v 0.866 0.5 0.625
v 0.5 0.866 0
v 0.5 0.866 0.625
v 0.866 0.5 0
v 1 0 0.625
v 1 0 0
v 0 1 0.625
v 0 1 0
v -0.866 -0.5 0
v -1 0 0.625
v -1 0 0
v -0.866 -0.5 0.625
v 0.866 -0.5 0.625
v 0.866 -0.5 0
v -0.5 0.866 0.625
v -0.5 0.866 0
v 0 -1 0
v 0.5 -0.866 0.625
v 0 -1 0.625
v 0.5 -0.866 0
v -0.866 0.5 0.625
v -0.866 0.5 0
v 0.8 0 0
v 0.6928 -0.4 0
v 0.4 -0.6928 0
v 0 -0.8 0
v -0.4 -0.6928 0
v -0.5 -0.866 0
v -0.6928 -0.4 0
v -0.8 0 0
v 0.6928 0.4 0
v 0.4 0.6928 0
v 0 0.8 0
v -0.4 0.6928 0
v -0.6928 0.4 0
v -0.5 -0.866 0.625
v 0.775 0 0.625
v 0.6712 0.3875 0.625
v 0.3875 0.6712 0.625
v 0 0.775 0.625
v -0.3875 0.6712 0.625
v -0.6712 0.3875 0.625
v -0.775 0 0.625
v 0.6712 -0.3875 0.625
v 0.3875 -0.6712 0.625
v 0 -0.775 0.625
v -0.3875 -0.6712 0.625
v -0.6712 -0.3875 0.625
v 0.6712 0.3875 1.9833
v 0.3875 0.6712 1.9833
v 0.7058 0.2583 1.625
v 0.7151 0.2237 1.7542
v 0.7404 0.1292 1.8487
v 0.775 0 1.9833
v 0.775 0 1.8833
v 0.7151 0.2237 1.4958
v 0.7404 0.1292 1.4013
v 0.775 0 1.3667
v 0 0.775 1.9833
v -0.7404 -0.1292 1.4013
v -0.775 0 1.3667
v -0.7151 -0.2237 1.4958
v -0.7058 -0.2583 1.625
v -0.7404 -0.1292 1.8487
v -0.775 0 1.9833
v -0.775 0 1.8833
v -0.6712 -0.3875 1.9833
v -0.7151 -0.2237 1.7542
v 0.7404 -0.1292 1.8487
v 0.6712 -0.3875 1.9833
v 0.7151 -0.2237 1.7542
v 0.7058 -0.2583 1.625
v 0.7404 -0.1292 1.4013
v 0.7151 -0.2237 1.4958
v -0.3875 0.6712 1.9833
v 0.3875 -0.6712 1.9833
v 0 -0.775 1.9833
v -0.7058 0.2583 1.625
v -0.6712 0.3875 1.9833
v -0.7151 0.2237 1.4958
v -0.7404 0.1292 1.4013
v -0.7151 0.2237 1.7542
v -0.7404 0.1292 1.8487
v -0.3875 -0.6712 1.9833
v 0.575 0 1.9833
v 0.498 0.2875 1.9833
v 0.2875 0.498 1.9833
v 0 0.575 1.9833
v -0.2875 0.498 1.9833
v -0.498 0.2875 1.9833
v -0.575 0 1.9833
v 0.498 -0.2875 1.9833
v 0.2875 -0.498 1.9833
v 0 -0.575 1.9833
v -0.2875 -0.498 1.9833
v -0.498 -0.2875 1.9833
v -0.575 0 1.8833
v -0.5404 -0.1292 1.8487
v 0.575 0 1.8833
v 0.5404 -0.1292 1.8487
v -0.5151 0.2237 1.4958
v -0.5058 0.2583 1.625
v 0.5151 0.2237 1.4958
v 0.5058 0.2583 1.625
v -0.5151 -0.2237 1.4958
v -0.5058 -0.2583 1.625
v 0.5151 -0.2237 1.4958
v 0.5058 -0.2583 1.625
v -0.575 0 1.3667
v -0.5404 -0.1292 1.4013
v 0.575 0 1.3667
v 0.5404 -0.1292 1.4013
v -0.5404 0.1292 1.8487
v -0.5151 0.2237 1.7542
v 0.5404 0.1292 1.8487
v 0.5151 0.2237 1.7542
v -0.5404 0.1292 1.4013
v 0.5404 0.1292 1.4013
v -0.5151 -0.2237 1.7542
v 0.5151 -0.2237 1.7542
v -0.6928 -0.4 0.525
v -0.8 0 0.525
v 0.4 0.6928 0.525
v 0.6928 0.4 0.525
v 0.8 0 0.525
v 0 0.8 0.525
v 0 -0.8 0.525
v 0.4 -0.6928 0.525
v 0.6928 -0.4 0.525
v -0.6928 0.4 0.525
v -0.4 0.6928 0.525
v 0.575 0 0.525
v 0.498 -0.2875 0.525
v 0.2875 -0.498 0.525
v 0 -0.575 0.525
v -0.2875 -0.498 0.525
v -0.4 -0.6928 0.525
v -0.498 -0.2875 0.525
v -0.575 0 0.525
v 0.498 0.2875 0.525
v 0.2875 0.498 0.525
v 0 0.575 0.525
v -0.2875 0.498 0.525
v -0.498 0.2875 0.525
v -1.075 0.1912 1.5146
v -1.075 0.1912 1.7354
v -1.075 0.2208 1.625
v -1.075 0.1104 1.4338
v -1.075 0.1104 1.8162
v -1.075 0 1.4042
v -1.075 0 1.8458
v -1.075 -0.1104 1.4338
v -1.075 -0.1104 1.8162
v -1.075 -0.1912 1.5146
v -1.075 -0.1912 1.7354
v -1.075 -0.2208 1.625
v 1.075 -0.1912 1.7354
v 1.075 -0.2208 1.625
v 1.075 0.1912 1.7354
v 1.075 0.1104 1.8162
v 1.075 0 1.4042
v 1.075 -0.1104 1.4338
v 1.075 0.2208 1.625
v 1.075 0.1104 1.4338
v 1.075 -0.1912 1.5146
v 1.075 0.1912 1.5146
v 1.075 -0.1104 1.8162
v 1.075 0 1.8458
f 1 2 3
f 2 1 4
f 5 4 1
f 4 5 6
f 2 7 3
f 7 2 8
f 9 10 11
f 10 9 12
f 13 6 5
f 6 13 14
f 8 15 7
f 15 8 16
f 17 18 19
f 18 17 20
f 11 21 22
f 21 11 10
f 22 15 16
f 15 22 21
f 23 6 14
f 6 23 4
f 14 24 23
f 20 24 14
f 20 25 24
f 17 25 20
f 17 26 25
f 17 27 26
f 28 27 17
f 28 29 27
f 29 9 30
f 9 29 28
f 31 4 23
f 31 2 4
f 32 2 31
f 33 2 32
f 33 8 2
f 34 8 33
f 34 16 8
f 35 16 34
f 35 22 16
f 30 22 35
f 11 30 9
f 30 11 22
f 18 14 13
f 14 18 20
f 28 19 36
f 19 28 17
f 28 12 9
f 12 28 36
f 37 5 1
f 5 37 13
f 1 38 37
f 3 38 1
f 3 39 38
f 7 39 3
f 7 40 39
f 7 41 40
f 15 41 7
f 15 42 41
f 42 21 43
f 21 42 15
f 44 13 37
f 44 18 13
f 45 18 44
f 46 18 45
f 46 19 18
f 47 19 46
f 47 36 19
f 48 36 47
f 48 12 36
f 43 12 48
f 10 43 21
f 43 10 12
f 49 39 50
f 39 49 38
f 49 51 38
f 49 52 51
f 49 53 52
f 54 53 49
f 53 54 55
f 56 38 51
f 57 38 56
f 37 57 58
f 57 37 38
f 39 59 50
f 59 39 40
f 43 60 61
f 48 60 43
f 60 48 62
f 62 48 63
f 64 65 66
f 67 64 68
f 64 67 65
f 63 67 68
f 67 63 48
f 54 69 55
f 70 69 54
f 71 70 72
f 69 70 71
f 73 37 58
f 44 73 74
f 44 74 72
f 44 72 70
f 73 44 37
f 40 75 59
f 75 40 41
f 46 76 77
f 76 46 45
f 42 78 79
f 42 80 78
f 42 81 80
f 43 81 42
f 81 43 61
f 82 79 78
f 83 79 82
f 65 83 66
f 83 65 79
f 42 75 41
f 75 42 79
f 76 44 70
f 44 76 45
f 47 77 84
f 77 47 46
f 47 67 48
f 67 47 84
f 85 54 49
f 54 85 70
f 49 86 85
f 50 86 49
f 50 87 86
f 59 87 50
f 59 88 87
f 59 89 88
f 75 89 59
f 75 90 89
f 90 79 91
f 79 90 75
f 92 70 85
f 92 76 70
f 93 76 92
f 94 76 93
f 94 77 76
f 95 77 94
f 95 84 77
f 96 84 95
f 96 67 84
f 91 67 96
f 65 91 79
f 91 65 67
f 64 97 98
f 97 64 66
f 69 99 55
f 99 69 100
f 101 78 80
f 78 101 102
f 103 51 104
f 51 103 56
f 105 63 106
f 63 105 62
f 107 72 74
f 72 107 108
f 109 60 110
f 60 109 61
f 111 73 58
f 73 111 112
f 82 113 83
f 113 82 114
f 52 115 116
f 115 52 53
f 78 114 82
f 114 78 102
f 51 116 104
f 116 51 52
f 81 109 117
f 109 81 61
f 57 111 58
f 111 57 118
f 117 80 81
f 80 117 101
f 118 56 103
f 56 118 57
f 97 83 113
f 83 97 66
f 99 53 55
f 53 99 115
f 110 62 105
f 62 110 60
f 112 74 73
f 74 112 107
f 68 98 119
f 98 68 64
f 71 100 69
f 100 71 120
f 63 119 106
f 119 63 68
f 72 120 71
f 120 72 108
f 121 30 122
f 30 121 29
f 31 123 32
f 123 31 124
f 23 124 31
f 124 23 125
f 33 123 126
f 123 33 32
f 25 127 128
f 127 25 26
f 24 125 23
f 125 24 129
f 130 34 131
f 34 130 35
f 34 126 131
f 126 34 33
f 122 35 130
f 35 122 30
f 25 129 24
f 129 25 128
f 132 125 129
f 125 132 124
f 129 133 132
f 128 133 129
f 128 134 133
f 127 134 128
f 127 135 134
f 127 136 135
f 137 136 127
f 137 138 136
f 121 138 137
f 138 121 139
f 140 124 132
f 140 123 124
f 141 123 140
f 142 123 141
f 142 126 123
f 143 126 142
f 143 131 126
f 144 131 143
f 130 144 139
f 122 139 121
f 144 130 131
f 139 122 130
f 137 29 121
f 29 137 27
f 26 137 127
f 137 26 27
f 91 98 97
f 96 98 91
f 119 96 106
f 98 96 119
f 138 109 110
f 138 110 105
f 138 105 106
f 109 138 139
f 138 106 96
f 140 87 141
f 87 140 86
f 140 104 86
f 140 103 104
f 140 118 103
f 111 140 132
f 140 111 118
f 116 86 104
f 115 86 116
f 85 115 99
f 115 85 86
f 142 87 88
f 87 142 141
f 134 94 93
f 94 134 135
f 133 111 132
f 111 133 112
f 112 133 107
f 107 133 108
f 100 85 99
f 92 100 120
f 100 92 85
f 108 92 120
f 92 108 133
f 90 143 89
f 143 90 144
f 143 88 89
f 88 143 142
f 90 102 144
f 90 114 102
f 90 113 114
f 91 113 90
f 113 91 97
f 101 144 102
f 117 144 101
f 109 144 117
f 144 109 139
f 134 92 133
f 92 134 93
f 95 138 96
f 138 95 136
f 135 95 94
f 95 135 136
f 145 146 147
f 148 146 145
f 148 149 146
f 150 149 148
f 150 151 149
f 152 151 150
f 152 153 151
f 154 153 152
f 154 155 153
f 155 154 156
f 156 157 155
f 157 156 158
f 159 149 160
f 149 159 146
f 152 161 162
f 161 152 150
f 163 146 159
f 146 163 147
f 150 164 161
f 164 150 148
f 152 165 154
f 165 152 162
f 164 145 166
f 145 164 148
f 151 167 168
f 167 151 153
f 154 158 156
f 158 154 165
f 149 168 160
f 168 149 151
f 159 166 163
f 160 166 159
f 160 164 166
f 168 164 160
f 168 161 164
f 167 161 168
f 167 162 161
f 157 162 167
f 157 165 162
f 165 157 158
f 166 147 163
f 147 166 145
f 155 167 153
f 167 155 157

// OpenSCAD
tolerance=0.075;
hole_radius=0.05;
grid_hole_radius=0.05;
outer_radius=1;
thickness=0.2;
hole_attach_height=0.05;
attach_thickness=0.1;
bottom_rotation_height=1.625;
top_rotation_height=1.35;
next_hole_radius=0.05;
next_hole_attach_height=0.05;
next_inner=0.8;
max_turn=90.0;
min_turn=90.0;
hole_twist=89.998;

//parameters that don't have to be defined explicitly
eps = tolerance/100;
inner_radius = outer_radius - thickness;
axle_offset = attach_thickness;
bottom_joint_attach_radius = outer_radius - hole_attach_height - grid_hole_radius*2 - tolerance;
fn = 12;
fnh = 6;

//solve for b = axle height
max_turn_b = outer_radius / tan((180 - max_turn)/2);
min_turn_b = outer_radius / tan((180 - min_turn)/2);
axle_radius = bottom_joint_attach_radius/3;

grid_hole_height = hole_radius*2 + hole_attach_height * 2;
bottom_joint_grid_clearance = bottom_rotation_height - (hole_attach_height*2 + hole_radius*2 + grid_hole_height + max_turn_b + attach_thickness);

module angled_cylinder(angle_deg_y, _h, _r, angle_deg_x = 0) {
    rotate([angle_deg_x, angle_deg_y, 0]) { // Rotate the cylinder 
            cylinder(h = _h, r = _r, center = true, $fn = fnh);
        }
}

module hole(_h) {
    cylinder(h = _h, r = grid_hole_radius, $fn = fnh);
}

//makes circle of holes
module circular_grid(_h, _r, _n) {
    for (i = [0:_n-1]) {
        angle = i * 360 / _n;
        x_pos = _r * cos(angle);
        y_pos = _r * sin(angle);
        translate([x_pos, y_pos, -eps]) {
            hole(_h);
        }
    }
}

//makes grid of holes
module hole_grid(hole_height, grid_h) {
    translate([0,0,hole_height]) {
        difference() {
            //cylinder
            cylinder(h = grid_h, r = (inner_radius + outer_radius)/2, 
                center=false, $fn = fn);
            //holes
            for (i = [0 : grid_hole_radius * 2 + hole_attach_height : inner_radius - grid_hole_radius * 2]) {
                circular_grid(grid_h + eps*2, i, ceil(6.28*i/(grid_hole_radius*4)));
            }
            
        } 
    }
}

module joint_bottom() {
    //make grid of holes
    grid_hole_height = hole_radius*2 + hole_attach_height * 2;
    //hole_grid(grid_hole_height, grid_hole_radius);
    
    bottom_joint_attach_height = max_turn_b + axle_radius + axle_offset;
   
    operating_height = hole_attach_height*2 + attach_thickness + hole_radius*2 + grid_hole_height + bottom_joint_grid_clearance;
    difference() {
        //bottom joint
        union() {
            cylinder(h=operating_height, r=outer_radius, $fn = fn);
            
            translate([0,0,operating_height]) {
                cylinder(h=bottom_joint_attach_height,r=bottom_joint_attach_radius,$fn=fn);
                //enforce min turn
                difference() {
                    cylinder(h=max_turn_b - min_turn_b,r=outer_radius,$fn=fn);
                    translate([-outer_radius,-outer_radius*2,-eps/2])
                    cube([outer_radius*2 + eps,outer_radius*2 + axle_radius + axle_offset + tolerance + eps,max_turn_b - min_turn_b + eps]);
                    
                    translate([-outer_radius,0,max_turn_b])
                    rotate([-(90+min_turn),0,0])
                    translate([0,-max_turn_b + eps/2,-axle_radius-axle_offset])
                    cube([outer_radius*2,max_turn_b - min_turn_b + eps,outer_radius*2+ axle_radius + axle_offset], center=false);
                }
                
                
            }
        }
        
        //hole for axle
        translate([0,0,operating_height + max_turn_b])
        rotate([0,90,0])
        cylinder(h=outer_radius*2,r=axle_radius,center=true,$fn=fn);
        
        //shelling
        cylinder(h=operating_height - attach_thickness, r=inner_radius, center = false, $fn = fn);
        
        cylinder(h=operating_height + bottom_joint_attach_height + eps, r =          bottom_joint_attach_radius - thickness, center = false, $fn = fn);
        //shell tolerance
        cylinder(h=eps, r=inner_radius, center=true,$fn = fn);
        
        //screw holes
//        translate([0,0,hole_radius + hole_attach_height]) 
//        rotate([0,0,hole_twist]) {
//            angled_cylinder(0, (outer_radius*1.5 + eps) * 2,  hole_radius, 90);
//            angled_cylinder(90, (outer_radius*1.5 + eps) * 2, hole_radius, 0);
//        } 
        
        //holes for routing strings
//        translate([0,-inner_radius + thickness,-hole_attach_height - grid_hole_radius + operating_height])
//        rotate([90,0,0])
//        cylinder(h=thickness + inner_radius + eps, r=grid_hole_radius,$fn=fn);
//        
//        translate([0,outer_radius,-hole_attach_height - grid_hole_radius + operating_height + max_turn_b - min_turn_b])
//        rotate([90,0,0])
//        cylinder(h=thickness + inner_radius + eps, r=grid_hole_radius,$fn=fn);
//        
//        translate([0,bottom_joint_attach_radius + hole_attach_height + grid_hole_radius,operating_height - attach_thickness - eps/2])
//        cylinder(h=attach_thickness + max_turn_b - min_turn_b - hole_attach_height + eps, r=grid_hole_radius,$fn=fn);
    }
}

module axle() {
    cylinder(h=outer_radius*2 + tolerance*2, r = axle_radius - tolerance/2, $fn = fn);
}

joint_bottom();

rotate([0,90,0])
translate([-bottom_rotation_height,0,-outer_radius - tolerance])
axle();
